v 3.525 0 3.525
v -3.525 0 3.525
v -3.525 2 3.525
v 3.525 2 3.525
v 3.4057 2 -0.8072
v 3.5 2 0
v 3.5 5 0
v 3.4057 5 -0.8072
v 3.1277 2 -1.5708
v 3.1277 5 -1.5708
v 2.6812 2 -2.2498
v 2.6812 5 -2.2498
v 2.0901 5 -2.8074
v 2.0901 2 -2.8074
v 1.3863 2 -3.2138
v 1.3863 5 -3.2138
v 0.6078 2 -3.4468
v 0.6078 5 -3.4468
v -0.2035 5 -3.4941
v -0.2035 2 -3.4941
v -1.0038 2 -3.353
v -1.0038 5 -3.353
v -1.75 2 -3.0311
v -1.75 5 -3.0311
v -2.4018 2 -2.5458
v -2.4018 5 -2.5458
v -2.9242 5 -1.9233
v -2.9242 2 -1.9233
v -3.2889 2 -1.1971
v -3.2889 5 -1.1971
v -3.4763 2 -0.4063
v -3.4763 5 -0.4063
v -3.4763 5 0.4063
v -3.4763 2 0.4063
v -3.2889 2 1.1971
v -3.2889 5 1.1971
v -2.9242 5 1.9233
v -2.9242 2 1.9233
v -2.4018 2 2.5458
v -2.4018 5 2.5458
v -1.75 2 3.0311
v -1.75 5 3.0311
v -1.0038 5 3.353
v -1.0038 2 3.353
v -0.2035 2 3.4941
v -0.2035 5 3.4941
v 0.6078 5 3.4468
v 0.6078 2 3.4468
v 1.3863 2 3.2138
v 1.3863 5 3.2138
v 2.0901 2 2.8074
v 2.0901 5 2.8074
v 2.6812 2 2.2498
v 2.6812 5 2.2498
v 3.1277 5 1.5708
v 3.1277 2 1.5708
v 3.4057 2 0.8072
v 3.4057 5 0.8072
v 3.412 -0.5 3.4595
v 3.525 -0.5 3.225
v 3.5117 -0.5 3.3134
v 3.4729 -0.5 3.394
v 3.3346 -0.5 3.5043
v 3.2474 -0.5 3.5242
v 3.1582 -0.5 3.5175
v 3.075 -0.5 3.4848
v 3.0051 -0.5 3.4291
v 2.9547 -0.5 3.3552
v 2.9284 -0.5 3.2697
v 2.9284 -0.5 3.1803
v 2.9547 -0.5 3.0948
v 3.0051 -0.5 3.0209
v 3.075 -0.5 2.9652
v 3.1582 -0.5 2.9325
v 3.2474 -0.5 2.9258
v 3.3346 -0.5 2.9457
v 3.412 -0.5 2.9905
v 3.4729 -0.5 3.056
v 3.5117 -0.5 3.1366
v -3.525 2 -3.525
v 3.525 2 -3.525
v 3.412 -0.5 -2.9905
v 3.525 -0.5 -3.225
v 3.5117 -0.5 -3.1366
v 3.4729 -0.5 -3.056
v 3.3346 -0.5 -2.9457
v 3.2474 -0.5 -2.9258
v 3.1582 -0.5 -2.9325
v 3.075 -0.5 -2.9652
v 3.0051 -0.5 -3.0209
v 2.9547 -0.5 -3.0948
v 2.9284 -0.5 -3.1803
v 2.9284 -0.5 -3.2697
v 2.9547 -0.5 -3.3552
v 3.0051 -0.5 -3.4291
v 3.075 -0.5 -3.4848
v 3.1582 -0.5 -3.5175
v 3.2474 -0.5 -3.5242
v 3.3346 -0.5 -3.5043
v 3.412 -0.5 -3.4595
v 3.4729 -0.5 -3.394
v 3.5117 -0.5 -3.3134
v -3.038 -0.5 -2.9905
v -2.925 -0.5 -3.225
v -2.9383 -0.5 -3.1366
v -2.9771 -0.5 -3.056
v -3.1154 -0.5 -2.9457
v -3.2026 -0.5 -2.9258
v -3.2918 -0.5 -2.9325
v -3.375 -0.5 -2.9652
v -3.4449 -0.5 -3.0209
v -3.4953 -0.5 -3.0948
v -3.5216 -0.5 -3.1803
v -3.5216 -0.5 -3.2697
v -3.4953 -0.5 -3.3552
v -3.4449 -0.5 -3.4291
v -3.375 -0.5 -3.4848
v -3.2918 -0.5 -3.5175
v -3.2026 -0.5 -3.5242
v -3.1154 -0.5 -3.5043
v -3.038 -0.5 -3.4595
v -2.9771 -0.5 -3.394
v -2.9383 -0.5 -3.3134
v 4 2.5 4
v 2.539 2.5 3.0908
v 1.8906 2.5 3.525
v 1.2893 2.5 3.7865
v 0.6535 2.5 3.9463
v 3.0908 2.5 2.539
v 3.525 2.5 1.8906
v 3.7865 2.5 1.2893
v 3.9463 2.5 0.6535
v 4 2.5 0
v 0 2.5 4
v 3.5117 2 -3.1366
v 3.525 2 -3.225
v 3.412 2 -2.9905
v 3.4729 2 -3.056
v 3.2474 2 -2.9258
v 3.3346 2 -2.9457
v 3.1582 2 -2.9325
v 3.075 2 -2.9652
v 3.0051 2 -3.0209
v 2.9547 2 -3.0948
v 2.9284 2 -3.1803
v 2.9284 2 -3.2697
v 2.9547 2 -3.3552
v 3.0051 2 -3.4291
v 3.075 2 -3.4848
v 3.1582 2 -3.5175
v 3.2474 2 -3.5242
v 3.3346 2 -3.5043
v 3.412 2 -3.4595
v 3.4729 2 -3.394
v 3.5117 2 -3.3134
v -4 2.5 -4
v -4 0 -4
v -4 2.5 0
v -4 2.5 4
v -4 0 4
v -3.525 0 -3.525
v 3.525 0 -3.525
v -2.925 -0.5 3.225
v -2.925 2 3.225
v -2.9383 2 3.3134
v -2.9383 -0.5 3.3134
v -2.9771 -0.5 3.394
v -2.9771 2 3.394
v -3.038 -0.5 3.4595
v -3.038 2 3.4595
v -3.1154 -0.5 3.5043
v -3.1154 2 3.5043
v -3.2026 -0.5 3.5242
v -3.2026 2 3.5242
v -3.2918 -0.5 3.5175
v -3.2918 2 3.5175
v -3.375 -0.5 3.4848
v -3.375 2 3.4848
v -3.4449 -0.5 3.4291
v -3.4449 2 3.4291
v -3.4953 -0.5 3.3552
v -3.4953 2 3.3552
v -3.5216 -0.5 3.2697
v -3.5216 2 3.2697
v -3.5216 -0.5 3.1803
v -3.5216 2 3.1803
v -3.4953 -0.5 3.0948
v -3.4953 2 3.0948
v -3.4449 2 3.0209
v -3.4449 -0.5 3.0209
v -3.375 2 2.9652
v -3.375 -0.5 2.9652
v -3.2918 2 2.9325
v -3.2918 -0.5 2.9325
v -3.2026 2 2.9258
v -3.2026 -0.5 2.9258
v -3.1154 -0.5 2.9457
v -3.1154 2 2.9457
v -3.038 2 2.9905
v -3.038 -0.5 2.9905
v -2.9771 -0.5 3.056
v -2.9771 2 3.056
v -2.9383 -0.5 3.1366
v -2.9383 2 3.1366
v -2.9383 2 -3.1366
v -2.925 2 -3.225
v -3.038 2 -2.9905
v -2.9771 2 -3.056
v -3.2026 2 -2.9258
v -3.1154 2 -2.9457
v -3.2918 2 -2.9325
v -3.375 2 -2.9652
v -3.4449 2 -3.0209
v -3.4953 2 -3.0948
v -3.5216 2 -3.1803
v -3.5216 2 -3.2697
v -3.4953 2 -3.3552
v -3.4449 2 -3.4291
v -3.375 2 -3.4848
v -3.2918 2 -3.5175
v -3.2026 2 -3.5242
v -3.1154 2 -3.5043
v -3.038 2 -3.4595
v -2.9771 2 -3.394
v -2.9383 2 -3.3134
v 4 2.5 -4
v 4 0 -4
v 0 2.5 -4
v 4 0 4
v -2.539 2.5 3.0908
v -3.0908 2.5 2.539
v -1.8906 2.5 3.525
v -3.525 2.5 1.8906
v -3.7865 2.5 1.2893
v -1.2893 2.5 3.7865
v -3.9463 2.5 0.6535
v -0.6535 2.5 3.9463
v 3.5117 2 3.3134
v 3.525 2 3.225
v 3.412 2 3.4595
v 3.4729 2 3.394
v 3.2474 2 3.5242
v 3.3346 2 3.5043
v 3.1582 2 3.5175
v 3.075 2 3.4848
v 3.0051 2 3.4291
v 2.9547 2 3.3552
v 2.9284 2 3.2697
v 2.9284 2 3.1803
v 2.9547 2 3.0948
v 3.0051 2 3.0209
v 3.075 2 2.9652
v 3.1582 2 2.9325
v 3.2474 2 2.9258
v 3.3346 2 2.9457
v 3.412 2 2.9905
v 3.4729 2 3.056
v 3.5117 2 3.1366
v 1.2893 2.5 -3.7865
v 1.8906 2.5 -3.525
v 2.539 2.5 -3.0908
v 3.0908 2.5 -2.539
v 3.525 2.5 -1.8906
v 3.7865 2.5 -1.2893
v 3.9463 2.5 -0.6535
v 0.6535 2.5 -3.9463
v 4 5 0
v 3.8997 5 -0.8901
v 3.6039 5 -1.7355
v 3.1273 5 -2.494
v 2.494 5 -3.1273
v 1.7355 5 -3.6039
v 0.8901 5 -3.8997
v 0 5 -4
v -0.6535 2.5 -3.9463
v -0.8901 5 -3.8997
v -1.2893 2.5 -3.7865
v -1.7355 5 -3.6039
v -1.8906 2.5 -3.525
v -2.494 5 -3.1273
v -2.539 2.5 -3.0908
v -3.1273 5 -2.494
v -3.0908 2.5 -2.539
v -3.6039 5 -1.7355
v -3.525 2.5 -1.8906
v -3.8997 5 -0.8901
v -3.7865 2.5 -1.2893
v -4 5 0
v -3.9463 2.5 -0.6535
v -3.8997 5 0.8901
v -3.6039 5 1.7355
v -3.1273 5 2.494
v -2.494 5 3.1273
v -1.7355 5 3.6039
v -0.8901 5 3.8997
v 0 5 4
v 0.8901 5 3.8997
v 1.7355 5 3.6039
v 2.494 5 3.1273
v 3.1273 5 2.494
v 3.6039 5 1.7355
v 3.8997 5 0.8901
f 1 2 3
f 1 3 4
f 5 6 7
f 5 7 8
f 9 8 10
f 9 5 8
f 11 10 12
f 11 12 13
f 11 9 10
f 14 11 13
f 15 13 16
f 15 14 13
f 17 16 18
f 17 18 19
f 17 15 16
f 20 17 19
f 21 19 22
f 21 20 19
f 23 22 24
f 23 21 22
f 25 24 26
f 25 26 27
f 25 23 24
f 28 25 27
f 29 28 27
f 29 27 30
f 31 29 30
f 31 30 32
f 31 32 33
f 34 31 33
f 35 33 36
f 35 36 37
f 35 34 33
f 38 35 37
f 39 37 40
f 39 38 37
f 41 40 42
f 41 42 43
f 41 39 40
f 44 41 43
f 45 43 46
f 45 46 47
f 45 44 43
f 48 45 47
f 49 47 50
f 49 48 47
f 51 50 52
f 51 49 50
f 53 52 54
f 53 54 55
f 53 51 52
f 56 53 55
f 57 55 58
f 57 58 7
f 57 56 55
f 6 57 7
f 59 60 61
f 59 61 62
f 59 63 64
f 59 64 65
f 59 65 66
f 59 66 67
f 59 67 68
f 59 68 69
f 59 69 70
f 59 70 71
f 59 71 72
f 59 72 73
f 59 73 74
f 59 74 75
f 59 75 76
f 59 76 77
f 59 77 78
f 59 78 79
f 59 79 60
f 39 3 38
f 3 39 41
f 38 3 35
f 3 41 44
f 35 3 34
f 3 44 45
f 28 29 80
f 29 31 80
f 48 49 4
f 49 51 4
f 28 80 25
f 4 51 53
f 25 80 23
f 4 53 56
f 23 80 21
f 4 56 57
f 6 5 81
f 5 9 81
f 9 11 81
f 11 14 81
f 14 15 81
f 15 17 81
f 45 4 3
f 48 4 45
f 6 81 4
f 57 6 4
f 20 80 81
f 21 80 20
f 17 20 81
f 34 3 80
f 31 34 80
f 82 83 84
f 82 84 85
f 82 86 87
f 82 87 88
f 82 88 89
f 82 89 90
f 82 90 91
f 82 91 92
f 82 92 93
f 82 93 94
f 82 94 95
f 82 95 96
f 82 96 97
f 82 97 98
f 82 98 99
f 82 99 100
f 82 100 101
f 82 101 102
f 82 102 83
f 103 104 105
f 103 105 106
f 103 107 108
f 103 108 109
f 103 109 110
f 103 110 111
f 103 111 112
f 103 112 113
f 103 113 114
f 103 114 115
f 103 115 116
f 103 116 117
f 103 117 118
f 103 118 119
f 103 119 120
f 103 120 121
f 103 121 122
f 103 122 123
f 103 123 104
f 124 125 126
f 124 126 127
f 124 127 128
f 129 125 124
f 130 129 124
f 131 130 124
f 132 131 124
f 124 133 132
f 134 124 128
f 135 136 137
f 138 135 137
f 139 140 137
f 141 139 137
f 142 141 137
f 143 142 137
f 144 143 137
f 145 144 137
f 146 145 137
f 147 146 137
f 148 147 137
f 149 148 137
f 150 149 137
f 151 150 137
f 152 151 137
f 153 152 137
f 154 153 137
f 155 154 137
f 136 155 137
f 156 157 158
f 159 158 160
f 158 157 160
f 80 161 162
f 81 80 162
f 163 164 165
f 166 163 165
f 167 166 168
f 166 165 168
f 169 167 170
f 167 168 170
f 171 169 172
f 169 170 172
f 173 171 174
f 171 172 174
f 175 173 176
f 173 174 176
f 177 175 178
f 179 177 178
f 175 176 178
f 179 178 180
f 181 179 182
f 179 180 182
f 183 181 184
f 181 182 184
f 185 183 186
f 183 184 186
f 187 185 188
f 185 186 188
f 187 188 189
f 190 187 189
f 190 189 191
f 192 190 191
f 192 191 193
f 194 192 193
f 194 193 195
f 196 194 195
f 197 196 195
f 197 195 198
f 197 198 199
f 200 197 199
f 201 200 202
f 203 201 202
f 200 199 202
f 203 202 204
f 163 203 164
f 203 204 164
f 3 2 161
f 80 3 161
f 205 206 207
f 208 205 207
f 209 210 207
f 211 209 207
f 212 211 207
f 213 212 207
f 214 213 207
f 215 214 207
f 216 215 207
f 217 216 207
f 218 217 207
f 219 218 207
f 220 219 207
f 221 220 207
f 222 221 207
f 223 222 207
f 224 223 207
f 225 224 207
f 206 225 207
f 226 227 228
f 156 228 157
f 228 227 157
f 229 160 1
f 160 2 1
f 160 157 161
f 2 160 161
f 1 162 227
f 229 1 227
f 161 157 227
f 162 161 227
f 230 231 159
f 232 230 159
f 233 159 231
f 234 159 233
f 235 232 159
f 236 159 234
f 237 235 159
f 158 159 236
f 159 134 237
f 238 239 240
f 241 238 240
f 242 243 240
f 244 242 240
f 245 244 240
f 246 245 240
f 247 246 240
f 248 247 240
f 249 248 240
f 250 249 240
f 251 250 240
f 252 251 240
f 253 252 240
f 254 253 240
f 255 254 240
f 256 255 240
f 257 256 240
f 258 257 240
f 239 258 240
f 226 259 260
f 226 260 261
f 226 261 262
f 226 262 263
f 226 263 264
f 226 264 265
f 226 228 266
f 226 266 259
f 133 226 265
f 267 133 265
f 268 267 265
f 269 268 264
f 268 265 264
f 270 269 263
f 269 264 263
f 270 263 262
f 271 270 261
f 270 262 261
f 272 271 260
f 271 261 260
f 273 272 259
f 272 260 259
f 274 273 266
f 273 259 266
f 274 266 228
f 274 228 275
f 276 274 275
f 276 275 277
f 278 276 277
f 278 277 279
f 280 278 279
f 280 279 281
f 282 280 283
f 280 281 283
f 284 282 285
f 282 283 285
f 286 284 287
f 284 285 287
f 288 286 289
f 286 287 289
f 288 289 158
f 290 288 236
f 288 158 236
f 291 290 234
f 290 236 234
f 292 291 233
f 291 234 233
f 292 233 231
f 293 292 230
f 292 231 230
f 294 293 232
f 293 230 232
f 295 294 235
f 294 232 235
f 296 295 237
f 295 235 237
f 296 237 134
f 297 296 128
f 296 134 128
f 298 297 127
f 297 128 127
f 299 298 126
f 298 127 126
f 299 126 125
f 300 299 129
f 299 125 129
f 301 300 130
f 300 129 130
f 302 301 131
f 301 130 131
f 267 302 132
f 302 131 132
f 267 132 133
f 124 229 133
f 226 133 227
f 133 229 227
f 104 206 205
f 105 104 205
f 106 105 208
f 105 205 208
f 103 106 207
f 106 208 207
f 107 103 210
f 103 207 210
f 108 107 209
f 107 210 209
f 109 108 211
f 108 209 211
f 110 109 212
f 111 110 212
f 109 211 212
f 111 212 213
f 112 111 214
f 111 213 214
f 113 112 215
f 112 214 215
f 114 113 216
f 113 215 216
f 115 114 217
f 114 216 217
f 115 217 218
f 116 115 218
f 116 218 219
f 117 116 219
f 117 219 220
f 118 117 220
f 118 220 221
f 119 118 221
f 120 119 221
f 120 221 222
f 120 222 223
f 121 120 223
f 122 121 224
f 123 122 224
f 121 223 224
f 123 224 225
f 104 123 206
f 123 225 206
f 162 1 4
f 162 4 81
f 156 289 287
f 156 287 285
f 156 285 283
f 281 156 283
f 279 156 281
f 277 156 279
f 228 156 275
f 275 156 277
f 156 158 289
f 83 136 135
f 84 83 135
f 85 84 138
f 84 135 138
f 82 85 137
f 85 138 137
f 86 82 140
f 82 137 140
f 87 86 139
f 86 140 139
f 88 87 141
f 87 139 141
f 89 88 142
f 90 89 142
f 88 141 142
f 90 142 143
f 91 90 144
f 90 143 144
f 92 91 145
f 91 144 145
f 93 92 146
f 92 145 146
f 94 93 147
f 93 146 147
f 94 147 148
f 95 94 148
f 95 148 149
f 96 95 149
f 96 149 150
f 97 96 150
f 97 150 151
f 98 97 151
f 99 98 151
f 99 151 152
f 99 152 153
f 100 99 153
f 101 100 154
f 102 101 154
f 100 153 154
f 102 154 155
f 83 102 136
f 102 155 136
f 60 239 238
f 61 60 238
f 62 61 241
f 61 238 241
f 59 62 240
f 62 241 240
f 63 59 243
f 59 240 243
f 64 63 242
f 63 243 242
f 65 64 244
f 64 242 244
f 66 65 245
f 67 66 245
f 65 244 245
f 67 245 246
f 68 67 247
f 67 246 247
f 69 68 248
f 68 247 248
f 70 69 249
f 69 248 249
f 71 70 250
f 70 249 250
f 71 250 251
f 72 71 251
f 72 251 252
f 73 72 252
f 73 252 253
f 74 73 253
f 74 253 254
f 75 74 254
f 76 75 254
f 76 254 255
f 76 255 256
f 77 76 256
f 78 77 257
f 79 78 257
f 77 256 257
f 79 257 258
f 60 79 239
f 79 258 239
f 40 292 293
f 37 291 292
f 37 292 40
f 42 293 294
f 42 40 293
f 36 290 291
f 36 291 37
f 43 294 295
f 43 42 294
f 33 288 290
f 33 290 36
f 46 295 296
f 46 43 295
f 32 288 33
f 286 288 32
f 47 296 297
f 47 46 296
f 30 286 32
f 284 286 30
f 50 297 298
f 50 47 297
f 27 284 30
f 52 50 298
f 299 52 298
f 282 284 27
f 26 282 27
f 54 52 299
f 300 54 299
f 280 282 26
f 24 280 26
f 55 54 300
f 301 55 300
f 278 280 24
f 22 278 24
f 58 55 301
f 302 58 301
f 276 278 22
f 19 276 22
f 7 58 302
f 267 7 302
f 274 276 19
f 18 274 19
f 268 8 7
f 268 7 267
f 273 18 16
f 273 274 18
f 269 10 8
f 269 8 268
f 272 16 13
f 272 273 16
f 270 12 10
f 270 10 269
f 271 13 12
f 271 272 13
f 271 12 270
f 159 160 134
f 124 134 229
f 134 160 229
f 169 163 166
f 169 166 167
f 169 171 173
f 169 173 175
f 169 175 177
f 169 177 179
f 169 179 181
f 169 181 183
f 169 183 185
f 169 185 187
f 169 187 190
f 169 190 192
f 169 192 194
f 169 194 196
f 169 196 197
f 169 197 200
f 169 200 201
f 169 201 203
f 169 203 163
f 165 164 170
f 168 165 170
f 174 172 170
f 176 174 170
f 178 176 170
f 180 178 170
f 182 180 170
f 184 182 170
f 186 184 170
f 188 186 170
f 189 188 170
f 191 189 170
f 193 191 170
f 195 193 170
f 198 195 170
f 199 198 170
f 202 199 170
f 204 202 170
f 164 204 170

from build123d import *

# Parameters (mm, degrees)
SKETCH1_W             = 8
SKETCH1_H             = 8
SKETCH1_W_2           = 7.05
SKETCH1_H_2           = 7.05
BOSS_EXTRUDE1_DEPTH   = 2
SKETCH3_R             = 4
SKETCH3_R_2           = 3.5
BOSS_EXTRUDE3_DEPTH   = 3
BOSS_EXTRUDE4_DEPTH   = 0.5
SKETCH10_R            = 0.3
BOSS_EXTRUDE6_DEPTH   = 2.5
BOSS_EXTRUDE6_2_DEPTH = 2.5
BOSS_EXTRUDE6_3_DEPTH = 2.5
BOSS_EXTRUDE6_4_DEPTH = 2.5


with BuildPart() as part:
    # Sketch1 → Boss-Extrude1 (new body)
    with BuildSketch(Plane(origin=(0, 0, 0), x_dir=(1, 0, 0), z_dir=(0, 1, 0))):
        Rectangle(SKETCH1_W, SKETCH1_H)
        Rectangle(SKETCH1_W_2, SKETCH1_H_2, mode=Mode.SUBTRACT)
    extrude(amount=BOSS_EXTRUDE1_DEPTH)

    # Sketch3 → Boss-Extrude3 (add)
    with BuildSketch(Plane(origin=(0, 2, 0), x_dir=(1, 0, 0), z_dir=(0, 1, 0))):
        Circle(SKETCH3_R)
        Circle(SKETCH3_R_2, mode=Mode.SUBTRACT)
    extrude(amount=BOSS_EXTRUDE3_DEPTH)

    # Sketch5 → Boss-Extrude4 (add)
    with BuildSketch(Plane(origin=(0, 2, 0), x_dir=(1, 0, 0), z_dir=(0, 1, 0))):
        with BuildLine():
            Line((4, 4), (0, 4))
            ThreePointArc((0, 4), (0.974679434, 3.879432948), (1.890601756, 3.525))
            Line((1.890601756, 3.525), (3.525, 3.525))
            Line((3.525, 3.525), (3.525, 1.890601756))
            ThreePointArc((3.525, 1.890601756), (3.879432948, 0.974679434), (4, 0))
            Line((4, 0), (4, 4))
        make_face()
        with BuildLine():
            Line((4, -4), (4, 0))
            ThreePointArc((4, 0), (3.879432948, -0.974679434), (3.525, -1.890601756))
            Line((3.525, -1.890601756), (3.525, -3.525))
            Line((3.525, -3.525), (1.890601756, -3.525))
            ThreePointArc((1.890601756, -3.525), (0.974679434, -3.879432948), (0, -4))
            Line((0, -4), (4, -4))
        make_face()
        with BuildLine():
            Line((-3.525, -3.525), (-3.525, -1.890601756))
            ThreePointArc((-3.525, -1.890601756), (-3.879432948, -0.974679434), (-4, 0))
            Line((-4, 0), (-4, -4))
            Line((-4, -4), (0, -4))
            ThreePointArc((0, -4), (-0.974679434, -3.879432948), (-1.890601756, -3.525))
            Line((-1.890601756, -3.525), (-3.525, -3.525))
        make_face()
        with BuildLine():
            ThreePointArc((-1.890601756, 3.525), (-0.974679434, 3.879432948), (0, 4))
            Line((0, 4), (-4, 4))
            Line((-4, 4), (-4, 0))
            ThreePointArc((-4, 0), (-3.879432948, 0.974679434), (-3.525, 1.890601756))
            Line((-3.525, 1.890601756), (-3.525, 3.525))
            Line((-3.525, 3.525), (-1.890601756, 3.525))
        make_face()
        with BuildLine():
            ThreePointArc((-3.525, 1.890601756), (-2.828427125, 2.828427125), (-1.890601756, 3.525))
            Line((-1.890601756, 3.525), (-3.525, 3.525))
            Line((-3.525, 3.525), (-3.525, 1.890601756))
        make_face()
        with BuildLine():
            ThreePointArc((-1.890601756, -3.525), (-2.828427125, -2.828427125), (-3.525, -1.890601756))
            Line((-3.525, -1.890601756), (-3.525, -3.525))
            Line((-3.525, -3.525), (-1.890601756, -3.525))
        make_face()
        with BuildLine():
            Line((3.525, -3.525), (3.525, -1.890601756))
            ThreePointArc((3.525, -1.890601756), (2.828427125, -2.828427125), (1.890601756, -3.525))
            Line((1.890601756, -3.525), (3.525, -3.525))
        make_face()
        with BuildLine():
            Line((3.525, 3.525), (1.890601756, 3.525))
            ThreePointArc((1.890601756, 3.525), (2.828427125, 2.828427125), (3.525, 1.890601756))
            Line((3.525, 1.890601756), (3.525, 3.525))
        make_face()
    extrude(amount=BOSS_EXTRUDE4_DEPTH)


with BuildPart() as body_2:
    # Sketch10 → Boss-Extrude6 (new body)
    with BuildSketch(Plane.XZ.offset(-2)):
        with Locations((3.225, 3.225)):
            Circle(SKETCH10_R)
    extrude(amount=BOSS_EXTRUDE6_DEPTH)


with BuildPart() as body_3:
    # Sketch10 → Boss-Extrude6 2 (new body)
    with BuildSketch(Plane.XZ.offset(-2)):
        with Locations((3.225, -3.225)):
            Circle(SKETCH10_R)
    extrude(amount=BOSS_EXTRUDE6_2_DEPTH)


with BuildPart() as body_4:
    # Sketch10 → Boss-Extrude6 3 (new body)
    with BuildSketch(Plane.XZ.offset(-2)):
        with Locations((-3.225, -3.225)):
            Circle(SKETCH10_R)
    extrude(amount=BOSS_EXTRUDE6_3_DEPTH)


with BuildPart() as body_5:
    # Sketch10 → Boss-Extrude6 4 (new body)
    with BuildSketch(Plane.XZ.offset(-2)):
        with Locations((-3.225, 3.225)):
            Circle(SKETCH10_R)
    extrude(amount=BOSS_EXTRUDE6_4_DEPTH)


solid = Compound([part.part, body_2.part, body_3.part, body_4.part, body_5.part])
